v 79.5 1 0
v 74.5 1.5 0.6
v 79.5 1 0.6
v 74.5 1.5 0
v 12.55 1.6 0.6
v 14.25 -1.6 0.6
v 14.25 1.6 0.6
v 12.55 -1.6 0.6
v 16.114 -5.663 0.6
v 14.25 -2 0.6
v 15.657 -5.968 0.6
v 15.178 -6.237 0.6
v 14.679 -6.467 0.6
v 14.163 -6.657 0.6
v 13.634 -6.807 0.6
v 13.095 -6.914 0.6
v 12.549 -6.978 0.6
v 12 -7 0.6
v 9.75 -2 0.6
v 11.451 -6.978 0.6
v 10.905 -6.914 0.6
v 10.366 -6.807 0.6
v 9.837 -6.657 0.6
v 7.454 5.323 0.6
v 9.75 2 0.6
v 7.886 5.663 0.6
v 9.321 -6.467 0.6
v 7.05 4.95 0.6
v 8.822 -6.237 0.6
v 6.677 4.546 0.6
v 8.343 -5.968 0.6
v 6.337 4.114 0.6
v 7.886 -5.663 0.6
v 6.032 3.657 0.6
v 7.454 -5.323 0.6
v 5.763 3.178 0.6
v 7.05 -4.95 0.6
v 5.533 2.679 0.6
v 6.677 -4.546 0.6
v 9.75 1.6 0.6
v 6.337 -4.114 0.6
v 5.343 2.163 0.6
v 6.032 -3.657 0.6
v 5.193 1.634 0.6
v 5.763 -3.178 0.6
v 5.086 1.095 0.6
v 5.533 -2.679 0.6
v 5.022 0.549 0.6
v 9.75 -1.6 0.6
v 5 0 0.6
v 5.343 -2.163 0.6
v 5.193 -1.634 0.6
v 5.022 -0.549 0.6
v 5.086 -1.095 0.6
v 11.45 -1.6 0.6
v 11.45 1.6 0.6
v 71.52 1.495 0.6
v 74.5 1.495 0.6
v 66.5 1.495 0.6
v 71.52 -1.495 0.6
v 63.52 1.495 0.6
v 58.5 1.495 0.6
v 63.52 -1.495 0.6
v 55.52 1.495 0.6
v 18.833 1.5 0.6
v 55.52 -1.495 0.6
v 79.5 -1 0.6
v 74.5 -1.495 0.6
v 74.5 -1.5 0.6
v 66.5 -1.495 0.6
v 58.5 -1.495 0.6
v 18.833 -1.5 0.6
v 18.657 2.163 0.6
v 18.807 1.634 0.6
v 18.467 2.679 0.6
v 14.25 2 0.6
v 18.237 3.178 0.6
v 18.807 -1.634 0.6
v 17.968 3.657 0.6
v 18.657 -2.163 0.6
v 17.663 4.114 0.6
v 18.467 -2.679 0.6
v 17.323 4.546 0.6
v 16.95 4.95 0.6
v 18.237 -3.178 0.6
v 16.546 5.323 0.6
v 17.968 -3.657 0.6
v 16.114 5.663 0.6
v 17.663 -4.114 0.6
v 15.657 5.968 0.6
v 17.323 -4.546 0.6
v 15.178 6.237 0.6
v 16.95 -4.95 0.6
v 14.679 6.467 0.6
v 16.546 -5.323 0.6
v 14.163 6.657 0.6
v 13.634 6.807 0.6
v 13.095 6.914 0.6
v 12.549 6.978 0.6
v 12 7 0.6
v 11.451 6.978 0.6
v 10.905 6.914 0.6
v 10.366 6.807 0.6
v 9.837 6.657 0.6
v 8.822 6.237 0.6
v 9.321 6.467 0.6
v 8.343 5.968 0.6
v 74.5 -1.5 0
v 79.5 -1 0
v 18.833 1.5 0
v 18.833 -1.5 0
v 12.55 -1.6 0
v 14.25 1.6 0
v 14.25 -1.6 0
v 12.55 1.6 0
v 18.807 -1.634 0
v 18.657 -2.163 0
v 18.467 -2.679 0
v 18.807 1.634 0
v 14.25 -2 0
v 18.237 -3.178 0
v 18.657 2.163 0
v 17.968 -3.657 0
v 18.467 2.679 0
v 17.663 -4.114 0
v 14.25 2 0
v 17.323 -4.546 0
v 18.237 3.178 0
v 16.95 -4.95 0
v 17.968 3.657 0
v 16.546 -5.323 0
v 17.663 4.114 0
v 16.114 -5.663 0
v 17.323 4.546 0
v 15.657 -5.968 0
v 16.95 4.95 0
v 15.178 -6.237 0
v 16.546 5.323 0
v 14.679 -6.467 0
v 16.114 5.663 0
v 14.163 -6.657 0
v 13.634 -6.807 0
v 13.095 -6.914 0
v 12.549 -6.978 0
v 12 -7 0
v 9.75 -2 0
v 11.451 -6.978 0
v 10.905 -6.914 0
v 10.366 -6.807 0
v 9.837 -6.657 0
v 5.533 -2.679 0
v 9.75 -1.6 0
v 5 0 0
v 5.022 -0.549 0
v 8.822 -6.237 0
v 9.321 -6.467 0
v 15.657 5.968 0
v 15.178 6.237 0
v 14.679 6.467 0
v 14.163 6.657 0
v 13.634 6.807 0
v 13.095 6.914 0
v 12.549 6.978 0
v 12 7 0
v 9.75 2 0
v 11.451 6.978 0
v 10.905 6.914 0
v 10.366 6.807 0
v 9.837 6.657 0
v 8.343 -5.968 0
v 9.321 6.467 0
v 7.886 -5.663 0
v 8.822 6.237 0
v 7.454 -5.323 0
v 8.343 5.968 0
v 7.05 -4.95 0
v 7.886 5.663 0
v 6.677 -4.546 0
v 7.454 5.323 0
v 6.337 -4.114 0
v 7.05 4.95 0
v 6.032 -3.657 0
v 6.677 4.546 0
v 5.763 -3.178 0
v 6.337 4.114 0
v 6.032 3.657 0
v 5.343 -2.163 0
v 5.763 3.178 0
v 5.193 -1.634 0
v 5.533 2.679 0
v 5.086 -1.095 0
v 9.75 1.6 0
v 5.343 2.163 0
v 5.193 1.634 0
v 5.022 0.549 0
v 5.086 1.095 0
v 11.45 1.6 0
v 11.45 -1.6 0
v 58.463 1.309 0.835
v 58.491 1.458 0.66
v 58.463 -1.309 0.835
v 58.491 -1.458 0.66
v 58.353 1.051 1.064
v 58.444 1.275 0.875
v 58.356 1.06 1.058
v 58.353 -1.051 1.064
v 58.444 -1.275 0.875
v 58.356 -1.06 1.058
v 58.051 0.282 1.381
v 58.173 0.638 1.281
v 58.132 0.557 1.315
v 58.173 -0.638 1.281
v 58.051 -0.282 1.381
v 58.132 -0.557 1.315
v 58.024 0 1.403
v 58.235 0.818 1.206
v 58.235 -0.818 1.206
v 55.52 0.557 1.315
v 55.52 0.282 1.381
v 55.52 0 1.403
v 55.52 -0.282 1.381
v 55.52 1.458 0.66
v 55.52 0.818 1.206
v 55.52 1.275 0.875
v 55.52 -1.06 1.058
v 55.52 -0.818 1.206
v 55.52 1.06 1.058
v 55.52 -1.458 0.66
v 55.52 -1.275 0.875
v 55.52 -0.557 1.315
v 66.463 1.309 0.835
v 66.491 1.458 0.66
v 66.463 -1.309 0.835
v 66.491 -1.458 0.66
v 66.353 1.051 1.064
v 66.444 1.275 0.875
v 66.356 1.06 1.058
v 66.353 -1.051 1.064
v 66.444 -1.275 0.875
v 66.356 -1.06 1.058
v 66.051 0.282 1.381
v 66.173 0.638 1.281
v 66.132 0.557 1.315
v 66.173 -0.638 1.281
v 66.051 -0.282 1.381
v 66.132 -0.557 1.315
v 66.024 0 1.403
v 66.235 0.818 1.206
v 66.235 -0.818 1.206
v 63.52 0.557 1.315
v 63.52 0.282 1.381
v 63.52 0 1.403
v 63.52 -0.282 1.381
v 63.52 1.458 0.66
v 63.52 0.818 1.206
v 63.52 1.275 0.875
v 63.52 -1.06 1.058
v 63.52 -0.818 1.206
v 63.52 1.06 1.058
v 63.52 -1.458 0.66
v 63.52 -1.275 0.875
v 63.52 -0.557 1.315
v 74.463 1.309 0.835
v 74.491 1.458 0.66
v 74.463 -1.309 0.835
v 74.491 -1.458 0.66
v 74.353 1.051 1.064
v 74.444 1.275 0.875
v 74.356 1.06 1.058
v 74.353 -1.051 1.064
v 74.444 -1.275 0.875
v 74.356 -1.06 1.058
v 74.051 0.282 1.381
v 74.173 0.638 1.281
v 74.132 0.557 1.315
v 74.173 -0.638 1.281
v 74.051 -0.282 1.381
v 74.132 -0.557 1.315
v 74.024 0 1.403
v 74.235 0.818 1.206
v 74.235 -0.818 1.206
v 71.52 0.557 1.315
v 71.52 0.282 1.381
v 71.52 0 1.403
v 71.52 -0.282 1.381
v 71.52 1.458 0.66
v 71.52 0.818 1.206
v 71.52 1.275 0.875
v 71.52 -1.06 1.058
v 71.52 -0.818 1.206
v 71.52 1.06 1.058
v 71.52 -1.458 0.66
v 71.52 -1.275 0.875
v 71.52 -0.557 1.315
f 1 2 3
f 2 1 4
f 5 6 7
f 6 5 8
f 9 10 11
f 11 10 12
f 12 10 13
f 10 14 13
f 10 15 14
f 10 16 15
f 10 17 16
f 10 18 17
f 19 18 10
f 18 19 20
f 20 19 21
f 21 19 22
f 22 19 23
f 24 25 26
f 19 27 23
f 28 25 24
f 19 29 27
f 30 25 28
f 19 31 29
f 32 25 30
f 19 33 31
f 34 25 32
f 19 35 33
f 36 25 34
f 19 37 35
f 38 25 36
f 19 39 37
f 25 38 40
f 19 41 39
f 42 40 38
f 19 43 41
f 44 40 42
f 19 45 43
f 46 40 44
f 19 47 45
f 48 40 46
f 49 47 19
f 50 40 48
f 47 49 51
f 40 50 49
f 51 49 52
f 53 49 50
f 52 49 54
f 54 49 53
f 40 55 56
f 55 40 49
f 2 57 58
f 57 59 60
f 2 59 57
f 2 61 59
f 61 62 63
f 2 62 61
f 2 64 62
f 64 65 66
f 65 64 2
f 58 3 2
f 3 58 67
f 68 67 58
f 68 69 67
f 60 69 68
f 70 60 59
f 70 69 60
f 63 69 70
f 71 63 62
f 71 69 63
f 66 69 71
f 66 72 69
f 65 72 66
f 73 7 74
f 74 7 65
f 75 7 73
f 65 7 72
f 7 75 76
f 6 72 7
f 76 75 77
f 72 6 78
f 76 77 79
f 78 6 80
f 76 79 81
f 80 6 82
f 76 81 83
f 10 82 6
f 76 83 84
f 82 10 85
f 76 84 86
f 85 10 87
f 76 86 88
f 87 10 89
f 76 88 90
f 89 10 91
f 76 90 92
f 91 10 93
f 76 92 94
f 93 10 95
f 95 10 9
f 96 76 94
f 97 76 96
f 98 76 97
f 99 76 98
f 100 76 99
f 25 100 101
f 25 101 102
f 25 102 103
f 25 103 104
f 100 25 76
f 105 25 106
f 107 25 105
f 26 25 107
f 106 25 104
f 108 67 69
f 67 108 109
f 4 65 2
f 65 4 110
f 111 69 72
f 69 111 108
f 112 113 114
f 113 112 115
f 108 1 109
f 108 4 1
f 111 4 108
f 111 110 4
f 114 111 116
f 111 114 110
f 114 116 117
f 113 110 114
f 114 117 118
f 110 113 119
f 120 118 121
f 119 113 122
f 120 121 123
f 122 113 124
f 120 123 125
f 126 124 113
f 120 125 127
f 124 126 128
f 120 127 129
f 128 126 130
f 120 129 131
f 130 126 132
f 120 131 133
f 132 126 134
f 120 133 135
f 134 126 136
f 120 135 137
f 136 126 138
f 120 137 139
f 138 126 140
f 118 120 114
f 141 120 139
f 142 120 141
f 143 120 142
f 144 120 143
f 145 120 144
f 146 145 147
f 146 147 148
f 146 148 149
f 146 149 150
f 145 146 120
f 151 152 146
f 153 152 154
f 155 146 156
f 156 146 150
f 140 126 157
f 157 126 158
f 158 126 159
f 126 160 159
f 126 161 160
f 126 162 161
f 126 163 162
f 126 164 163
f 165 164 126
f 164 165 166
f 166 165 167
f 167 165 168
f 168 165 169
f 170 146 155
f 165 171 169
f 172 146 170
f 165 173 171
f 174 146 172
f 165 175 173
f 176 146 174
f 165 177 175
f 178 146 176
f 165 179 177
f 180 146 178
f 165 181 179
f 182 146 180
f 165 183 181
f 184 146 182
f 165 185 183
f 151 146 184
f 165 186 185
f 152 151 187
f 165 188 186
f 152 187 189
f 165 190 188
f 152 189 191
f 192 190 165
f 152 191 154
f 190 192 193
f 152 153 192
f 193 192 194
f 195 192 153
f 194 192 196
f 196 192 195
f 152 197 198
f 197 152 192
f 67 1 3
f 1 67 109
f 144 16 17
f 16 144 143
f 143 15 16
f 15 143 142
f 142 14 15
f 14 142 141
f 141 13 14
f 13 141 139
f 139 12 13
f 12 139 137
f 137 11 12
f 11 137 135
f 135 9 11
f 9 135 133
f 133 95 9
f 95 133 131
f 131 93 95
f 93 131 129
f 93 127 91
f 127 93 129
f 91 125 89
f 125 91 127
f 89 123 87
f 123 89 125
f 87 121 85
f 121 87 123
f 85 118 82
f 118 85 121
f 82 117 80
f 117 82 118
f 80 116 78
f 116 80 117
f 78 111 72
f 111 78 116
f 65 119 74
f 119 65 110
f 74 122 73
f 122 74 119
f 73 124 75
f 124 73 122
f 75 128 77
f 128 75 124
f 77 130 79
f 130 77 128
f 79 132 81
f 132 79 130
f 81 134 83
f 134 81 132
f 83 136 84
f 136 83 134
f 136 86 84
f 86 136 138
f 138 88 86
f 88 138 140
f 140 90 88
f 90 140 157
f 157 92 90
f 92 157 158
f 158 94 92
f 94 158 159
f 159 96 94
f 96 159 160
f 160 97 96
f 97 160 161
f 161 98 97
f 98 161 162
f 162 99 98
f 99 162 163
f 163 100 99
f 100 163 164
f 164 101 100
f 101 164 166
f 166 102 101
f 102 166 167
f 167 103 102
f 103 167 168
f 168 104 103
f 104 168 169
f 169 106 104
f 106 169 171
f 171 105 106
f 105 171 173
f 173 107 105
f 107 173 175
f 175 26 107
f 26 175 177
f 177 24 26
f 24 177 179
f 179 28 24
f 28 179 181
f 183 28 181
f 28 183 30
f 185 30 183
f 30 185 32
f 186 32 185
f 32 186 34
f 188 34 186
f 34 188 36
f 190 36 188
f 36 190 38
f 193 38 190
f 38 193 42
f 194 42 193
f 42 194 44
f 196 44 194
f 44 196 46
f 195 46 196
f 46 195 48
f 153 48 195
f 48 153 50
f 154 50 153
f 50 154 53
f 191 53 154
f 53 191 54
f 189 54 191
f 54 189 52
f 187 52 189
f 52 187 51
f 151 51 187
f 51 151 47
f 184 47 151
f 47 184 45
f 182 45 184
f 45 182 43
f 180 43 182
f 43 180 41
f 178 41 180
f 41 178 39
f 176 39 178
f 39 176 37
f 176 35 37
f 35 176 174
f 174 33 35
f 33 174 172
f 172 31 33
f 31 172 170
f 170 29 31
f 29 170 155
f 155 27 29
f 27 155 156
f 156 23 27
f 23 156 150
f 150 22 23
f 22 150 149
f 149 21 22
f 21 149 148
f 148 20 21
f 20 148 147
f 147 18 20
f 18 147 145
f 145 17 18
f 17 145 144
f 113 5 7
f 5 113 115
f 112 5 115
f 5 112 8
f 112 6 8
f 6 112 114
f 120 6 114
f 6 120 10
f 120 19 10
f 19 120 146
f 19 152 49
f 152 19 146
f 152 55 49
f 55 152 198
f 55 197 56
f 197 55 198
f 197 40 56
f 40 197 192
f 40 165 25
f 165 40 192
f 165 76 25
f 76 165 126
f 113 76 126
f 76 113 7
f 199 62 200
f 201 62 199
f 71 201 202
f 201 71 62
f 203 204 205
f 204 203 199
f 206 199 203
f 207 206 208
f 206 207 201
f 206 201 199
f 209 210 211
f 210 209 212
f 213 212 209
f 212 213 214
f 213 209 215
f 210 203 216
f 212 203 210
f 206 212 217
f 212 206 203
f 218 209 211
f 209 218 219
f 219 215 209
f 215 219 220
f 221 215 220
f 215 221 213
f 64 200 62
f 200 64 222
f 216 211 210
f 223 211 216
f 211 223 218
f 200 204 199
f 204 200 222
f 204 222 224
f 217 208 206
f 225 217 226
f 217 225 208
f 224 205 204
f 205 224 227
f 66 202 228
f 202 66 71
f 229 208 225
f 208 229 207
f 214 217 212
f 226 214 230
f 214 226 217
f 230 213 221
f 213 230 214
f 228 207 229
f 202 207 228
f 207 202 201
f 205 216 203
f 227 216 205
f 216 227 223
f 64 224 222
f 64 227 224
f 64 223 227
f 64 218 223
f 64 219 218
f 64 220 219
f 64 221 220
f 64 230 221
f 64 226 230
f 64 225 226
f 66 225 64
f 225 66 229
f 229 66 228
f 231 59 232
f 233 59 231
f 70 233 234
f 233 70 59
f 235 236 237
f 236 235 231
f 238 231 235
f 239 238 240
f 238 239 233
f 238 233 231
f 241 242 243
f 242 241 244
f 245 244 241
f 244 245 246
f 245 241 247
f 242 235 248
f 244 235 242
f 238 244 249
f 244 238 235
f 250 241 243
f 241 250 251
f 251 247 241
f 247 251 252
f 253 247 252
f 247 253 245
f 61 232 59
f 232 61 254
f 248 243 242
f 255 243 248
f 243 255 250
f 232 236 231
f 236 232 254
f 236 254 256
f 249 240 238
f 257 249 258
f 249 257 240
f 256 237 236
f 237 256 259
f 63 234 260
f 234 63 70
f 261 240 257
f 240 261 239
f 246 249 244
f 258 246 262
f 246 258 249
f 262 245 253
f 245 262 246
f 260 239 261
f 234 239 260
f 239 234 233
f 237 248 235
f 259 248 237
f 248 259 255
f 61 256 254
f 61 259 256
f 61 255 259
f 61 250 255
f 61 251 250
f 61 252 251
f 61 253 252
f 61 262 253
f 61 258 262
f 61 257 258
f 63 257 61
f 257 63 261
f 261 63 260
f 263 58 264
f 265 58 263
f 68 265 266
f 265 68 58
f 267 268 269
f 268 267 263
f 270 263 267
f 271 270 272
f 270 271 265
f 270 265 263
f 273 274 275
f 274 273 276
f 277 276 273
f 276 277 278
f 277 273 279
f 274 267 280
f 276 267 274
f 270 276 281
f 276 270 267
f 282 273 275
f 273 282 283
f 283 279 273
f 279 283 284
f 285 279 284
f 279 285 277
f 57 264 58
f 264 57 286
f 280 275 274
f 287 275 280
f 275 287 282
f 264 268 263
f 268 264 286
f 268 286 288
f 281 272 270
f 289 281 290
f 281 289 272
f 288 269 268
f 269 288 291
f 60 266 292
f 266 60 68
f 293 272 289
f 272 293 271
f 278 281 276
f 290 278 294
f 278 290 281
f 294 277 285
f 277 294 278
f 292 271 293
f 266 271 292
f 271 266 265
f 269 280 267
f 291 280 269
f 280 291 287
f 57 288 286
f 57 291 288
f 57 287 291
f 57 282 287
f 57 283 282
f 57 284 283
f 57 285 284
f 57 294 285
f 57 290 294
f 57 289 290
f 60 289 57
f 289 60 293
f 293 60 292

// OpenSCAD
//TPU Cable Tie
//By Ben Caron 12/30/2022
// modified for TPU or PET by Brian Alano
// V1.1.0

/*[ Basic ]*/

bump_count = 3;
bump_shape = 1; //[1:one-way, 2:both-ways]
make_double_tie = 0; //[0:false, 1:true]
filament = "PET";// ["PET","TPU"]

/*[ Double Slot ]*/

make_double_slot = 0; //[0:false, 1:true]
//spacing between each slot
double_slot_spacing = 6;

/*[ Mounting Hole ]*/

make_mounting_hole = 0; //[0:false, 1:true]
mounting_hole_ID = 3.5; 
mounting_hole_OD = 9;
//distance from slot to hole center
mounting_hole_offset = 12;
mounting_hole_thick = 2; //[0.2:0.2:4]

/*[ Advanced ]*/
base_thick = .6; //[0.2:0.2:4]
end_thick = 0.6; //[0.2:0.2:4]
base_wide = 3;
end_radius = 7;
slot_height = 1.1;
//distance from last bump to slot
slot_distance = 45;
tab_slot_w = 0.4;
// ratio of tab length to base thickness, defining stiffness of the tab
tab_slot_length_ratio = 7.5; 

bump_pitch = 8;
bump_height = 1.5;

tip_long = 5;
tip_wide = 2;   


/* [Hidden] */
epsilon = 0.01;
quality = 10;  //curve quality
quality_small = quality*4;
quality_large = quality*4*2;
tab_slot_length = base_thick*tab_slot_length_ratio;

slot_long = base_wide+1;
base_long = slot_distance + (bump_count-1)*bump_pitch + bump_height;
mounting_hole_offset2 = mounting_hole_offset + double_slot_spacing*make_double_slot;
_end_thick = max(end_thick, base_thick);
_mounting_hole_thick = max(mounting_hole_thick, end_thick);

//Main build
double_tie()
{
    union()
    {
        if(make_mounting_hole)
            build_BaseWithHole();
        else
            build_Base();
        place_bumps();
    }
}


module build_BaseWithHole()
{
    
    difference()
    {
        
        union()
        {
            build_Base();
            
            //mounting hole outside
            linear_extrude(_mounting_hole_thick)
            translate([-mounting_hole_offset2,0])
            circle(mounting_hole_OD/2, $fn=quality_large);
            
            //connect mounting hole to base
            linear_extrude(min(_end_thick, _mounting_hole_thick))
            translate([-mounting_hole_offset2, -(mounting_hole_OD<=end_radius*2?mounting_hole_OD:end_radius*2)/2])
            square([mounting_hole_offset-slot_height/2-epsilon, mounting_hole_OD<=end_radius*2?mounting_hole_OD:end_radius*2]);
        }
        
        //mounting hole cut
        translate([-mounting_hole_offset2, 0, -_mounting_hole_thick/2])
        linear_extrude(_mounting_hole_thick*2)
        circle(mounting_hole_ID/2, $fn=quality_small);
    }
}

module build_Base()
{
    union()
    {
        linear_extrude(base_thick)
        union()
        {
            //base
            translate([slot_height/2+end_radius*.75,-base_wide/2])
            square([base_long-slot_height/2-end_radius*0.75,base_wide]);
            
            //Tip
            translate([base_long,0])
            polygon([[tip_long,-tip_wide/2],[tip_long,tip_wide/2],[-0,base_wide/2],[-0,-base_wide/2]]);
            
            
        }
            
        linear_extrude(_end_thick)
        difference()
        {
            union()
            {
                //end
                circle(end_radius, $fn=quality_large);
                
                if(make_double_slot)
                {
                    translate([-double_slot_spacing,0])
                    circle(end_radius, $fn=quality_large);
                    
                    translate([-double_slot_spacing/2,0])
                    square([double_slot_spacing,end_radius*2],center=true);
                }
            }
            
            //slot
            square([slot_height,slot_long], center=true);
            if(make_double_slot)
            {
                translate([-double_slot_spacing,0])
                square([slot_height,slot_long], center=true);
            }
            // tabs
            if (filament == "PET") {
                translate([0,(slot_long-tab_slot_w)/2]) square([tab_slot_length, tab_slot_w], center=true);
                translate([0,-(slot_long-tab_slot_w)/2]) square([tab_slot_length, tab_slot_w], center=true);
            }
        }
    }
}

module build_Bump_shape()
{
    if(bump_shape == 2)
        build_Bump();
    else
    {
        translate([-bump_height, 0])
        scale([2,1,1])
        difference()
        {
            build_Bump();
            
            linear_extrude(bump_height+base_thick+epsilon)
            translate([-bump_height, -base_wide/2])
            square([bump_height+epsilon, base_wide+epsilon]);
        }
    }
}

module build_Bump()
{
    rotate([0,-90,0])
    intersection()
    {
        translate([base_thick, -base_wide/2])
        rotate([-90,-90,0])
        linear_extrude(base_wide)
        difference()
        {
            circle(bump_height, $fn=quality_small);
            
            translate([-bump_height,-bump_height*2-epsilon])
            square([bump_height*2, bump_height*2]);
        }
        
        cut_ofs = 1;
        cut_rad = sqrt(pow(base_wide/2,2)+pow(cut_ofs,2));
        translate([base_thick-cut_ofs, 0, -bump_height])
        linear_extrude(bump_height*2)
        circle(cut_rad, $fn=quality_small);
    }
}

module place_bumps()
{
    translate([slot_distance,0,0])
    for ( i = [0:1:bump_count-1])
    {
        translate([i*bump_pitch,0,0])
        build_Bump_shape();
    }
}

module double_tie()
{
    union()
    {
        //original
        translate([mounting_hole_offset2,0])
        children();
        
        if(make_double_tie)
        {
            //mirrored copy
            mirror([1,0,0])
            translate([mounting_hole_offset2,0])
            children();
            
            if(!make_mounting_hole)
            {
                //connect the two copies
                linear_extrude(base_thick)
                square([mounting_hole_offset*2-slot_height,(base_wide+end_radius*2)/2], center=true);
            }
        }
    }
}

module copy_mirror(vec)
{
    children();
    mirror(vec)
    children();
}
